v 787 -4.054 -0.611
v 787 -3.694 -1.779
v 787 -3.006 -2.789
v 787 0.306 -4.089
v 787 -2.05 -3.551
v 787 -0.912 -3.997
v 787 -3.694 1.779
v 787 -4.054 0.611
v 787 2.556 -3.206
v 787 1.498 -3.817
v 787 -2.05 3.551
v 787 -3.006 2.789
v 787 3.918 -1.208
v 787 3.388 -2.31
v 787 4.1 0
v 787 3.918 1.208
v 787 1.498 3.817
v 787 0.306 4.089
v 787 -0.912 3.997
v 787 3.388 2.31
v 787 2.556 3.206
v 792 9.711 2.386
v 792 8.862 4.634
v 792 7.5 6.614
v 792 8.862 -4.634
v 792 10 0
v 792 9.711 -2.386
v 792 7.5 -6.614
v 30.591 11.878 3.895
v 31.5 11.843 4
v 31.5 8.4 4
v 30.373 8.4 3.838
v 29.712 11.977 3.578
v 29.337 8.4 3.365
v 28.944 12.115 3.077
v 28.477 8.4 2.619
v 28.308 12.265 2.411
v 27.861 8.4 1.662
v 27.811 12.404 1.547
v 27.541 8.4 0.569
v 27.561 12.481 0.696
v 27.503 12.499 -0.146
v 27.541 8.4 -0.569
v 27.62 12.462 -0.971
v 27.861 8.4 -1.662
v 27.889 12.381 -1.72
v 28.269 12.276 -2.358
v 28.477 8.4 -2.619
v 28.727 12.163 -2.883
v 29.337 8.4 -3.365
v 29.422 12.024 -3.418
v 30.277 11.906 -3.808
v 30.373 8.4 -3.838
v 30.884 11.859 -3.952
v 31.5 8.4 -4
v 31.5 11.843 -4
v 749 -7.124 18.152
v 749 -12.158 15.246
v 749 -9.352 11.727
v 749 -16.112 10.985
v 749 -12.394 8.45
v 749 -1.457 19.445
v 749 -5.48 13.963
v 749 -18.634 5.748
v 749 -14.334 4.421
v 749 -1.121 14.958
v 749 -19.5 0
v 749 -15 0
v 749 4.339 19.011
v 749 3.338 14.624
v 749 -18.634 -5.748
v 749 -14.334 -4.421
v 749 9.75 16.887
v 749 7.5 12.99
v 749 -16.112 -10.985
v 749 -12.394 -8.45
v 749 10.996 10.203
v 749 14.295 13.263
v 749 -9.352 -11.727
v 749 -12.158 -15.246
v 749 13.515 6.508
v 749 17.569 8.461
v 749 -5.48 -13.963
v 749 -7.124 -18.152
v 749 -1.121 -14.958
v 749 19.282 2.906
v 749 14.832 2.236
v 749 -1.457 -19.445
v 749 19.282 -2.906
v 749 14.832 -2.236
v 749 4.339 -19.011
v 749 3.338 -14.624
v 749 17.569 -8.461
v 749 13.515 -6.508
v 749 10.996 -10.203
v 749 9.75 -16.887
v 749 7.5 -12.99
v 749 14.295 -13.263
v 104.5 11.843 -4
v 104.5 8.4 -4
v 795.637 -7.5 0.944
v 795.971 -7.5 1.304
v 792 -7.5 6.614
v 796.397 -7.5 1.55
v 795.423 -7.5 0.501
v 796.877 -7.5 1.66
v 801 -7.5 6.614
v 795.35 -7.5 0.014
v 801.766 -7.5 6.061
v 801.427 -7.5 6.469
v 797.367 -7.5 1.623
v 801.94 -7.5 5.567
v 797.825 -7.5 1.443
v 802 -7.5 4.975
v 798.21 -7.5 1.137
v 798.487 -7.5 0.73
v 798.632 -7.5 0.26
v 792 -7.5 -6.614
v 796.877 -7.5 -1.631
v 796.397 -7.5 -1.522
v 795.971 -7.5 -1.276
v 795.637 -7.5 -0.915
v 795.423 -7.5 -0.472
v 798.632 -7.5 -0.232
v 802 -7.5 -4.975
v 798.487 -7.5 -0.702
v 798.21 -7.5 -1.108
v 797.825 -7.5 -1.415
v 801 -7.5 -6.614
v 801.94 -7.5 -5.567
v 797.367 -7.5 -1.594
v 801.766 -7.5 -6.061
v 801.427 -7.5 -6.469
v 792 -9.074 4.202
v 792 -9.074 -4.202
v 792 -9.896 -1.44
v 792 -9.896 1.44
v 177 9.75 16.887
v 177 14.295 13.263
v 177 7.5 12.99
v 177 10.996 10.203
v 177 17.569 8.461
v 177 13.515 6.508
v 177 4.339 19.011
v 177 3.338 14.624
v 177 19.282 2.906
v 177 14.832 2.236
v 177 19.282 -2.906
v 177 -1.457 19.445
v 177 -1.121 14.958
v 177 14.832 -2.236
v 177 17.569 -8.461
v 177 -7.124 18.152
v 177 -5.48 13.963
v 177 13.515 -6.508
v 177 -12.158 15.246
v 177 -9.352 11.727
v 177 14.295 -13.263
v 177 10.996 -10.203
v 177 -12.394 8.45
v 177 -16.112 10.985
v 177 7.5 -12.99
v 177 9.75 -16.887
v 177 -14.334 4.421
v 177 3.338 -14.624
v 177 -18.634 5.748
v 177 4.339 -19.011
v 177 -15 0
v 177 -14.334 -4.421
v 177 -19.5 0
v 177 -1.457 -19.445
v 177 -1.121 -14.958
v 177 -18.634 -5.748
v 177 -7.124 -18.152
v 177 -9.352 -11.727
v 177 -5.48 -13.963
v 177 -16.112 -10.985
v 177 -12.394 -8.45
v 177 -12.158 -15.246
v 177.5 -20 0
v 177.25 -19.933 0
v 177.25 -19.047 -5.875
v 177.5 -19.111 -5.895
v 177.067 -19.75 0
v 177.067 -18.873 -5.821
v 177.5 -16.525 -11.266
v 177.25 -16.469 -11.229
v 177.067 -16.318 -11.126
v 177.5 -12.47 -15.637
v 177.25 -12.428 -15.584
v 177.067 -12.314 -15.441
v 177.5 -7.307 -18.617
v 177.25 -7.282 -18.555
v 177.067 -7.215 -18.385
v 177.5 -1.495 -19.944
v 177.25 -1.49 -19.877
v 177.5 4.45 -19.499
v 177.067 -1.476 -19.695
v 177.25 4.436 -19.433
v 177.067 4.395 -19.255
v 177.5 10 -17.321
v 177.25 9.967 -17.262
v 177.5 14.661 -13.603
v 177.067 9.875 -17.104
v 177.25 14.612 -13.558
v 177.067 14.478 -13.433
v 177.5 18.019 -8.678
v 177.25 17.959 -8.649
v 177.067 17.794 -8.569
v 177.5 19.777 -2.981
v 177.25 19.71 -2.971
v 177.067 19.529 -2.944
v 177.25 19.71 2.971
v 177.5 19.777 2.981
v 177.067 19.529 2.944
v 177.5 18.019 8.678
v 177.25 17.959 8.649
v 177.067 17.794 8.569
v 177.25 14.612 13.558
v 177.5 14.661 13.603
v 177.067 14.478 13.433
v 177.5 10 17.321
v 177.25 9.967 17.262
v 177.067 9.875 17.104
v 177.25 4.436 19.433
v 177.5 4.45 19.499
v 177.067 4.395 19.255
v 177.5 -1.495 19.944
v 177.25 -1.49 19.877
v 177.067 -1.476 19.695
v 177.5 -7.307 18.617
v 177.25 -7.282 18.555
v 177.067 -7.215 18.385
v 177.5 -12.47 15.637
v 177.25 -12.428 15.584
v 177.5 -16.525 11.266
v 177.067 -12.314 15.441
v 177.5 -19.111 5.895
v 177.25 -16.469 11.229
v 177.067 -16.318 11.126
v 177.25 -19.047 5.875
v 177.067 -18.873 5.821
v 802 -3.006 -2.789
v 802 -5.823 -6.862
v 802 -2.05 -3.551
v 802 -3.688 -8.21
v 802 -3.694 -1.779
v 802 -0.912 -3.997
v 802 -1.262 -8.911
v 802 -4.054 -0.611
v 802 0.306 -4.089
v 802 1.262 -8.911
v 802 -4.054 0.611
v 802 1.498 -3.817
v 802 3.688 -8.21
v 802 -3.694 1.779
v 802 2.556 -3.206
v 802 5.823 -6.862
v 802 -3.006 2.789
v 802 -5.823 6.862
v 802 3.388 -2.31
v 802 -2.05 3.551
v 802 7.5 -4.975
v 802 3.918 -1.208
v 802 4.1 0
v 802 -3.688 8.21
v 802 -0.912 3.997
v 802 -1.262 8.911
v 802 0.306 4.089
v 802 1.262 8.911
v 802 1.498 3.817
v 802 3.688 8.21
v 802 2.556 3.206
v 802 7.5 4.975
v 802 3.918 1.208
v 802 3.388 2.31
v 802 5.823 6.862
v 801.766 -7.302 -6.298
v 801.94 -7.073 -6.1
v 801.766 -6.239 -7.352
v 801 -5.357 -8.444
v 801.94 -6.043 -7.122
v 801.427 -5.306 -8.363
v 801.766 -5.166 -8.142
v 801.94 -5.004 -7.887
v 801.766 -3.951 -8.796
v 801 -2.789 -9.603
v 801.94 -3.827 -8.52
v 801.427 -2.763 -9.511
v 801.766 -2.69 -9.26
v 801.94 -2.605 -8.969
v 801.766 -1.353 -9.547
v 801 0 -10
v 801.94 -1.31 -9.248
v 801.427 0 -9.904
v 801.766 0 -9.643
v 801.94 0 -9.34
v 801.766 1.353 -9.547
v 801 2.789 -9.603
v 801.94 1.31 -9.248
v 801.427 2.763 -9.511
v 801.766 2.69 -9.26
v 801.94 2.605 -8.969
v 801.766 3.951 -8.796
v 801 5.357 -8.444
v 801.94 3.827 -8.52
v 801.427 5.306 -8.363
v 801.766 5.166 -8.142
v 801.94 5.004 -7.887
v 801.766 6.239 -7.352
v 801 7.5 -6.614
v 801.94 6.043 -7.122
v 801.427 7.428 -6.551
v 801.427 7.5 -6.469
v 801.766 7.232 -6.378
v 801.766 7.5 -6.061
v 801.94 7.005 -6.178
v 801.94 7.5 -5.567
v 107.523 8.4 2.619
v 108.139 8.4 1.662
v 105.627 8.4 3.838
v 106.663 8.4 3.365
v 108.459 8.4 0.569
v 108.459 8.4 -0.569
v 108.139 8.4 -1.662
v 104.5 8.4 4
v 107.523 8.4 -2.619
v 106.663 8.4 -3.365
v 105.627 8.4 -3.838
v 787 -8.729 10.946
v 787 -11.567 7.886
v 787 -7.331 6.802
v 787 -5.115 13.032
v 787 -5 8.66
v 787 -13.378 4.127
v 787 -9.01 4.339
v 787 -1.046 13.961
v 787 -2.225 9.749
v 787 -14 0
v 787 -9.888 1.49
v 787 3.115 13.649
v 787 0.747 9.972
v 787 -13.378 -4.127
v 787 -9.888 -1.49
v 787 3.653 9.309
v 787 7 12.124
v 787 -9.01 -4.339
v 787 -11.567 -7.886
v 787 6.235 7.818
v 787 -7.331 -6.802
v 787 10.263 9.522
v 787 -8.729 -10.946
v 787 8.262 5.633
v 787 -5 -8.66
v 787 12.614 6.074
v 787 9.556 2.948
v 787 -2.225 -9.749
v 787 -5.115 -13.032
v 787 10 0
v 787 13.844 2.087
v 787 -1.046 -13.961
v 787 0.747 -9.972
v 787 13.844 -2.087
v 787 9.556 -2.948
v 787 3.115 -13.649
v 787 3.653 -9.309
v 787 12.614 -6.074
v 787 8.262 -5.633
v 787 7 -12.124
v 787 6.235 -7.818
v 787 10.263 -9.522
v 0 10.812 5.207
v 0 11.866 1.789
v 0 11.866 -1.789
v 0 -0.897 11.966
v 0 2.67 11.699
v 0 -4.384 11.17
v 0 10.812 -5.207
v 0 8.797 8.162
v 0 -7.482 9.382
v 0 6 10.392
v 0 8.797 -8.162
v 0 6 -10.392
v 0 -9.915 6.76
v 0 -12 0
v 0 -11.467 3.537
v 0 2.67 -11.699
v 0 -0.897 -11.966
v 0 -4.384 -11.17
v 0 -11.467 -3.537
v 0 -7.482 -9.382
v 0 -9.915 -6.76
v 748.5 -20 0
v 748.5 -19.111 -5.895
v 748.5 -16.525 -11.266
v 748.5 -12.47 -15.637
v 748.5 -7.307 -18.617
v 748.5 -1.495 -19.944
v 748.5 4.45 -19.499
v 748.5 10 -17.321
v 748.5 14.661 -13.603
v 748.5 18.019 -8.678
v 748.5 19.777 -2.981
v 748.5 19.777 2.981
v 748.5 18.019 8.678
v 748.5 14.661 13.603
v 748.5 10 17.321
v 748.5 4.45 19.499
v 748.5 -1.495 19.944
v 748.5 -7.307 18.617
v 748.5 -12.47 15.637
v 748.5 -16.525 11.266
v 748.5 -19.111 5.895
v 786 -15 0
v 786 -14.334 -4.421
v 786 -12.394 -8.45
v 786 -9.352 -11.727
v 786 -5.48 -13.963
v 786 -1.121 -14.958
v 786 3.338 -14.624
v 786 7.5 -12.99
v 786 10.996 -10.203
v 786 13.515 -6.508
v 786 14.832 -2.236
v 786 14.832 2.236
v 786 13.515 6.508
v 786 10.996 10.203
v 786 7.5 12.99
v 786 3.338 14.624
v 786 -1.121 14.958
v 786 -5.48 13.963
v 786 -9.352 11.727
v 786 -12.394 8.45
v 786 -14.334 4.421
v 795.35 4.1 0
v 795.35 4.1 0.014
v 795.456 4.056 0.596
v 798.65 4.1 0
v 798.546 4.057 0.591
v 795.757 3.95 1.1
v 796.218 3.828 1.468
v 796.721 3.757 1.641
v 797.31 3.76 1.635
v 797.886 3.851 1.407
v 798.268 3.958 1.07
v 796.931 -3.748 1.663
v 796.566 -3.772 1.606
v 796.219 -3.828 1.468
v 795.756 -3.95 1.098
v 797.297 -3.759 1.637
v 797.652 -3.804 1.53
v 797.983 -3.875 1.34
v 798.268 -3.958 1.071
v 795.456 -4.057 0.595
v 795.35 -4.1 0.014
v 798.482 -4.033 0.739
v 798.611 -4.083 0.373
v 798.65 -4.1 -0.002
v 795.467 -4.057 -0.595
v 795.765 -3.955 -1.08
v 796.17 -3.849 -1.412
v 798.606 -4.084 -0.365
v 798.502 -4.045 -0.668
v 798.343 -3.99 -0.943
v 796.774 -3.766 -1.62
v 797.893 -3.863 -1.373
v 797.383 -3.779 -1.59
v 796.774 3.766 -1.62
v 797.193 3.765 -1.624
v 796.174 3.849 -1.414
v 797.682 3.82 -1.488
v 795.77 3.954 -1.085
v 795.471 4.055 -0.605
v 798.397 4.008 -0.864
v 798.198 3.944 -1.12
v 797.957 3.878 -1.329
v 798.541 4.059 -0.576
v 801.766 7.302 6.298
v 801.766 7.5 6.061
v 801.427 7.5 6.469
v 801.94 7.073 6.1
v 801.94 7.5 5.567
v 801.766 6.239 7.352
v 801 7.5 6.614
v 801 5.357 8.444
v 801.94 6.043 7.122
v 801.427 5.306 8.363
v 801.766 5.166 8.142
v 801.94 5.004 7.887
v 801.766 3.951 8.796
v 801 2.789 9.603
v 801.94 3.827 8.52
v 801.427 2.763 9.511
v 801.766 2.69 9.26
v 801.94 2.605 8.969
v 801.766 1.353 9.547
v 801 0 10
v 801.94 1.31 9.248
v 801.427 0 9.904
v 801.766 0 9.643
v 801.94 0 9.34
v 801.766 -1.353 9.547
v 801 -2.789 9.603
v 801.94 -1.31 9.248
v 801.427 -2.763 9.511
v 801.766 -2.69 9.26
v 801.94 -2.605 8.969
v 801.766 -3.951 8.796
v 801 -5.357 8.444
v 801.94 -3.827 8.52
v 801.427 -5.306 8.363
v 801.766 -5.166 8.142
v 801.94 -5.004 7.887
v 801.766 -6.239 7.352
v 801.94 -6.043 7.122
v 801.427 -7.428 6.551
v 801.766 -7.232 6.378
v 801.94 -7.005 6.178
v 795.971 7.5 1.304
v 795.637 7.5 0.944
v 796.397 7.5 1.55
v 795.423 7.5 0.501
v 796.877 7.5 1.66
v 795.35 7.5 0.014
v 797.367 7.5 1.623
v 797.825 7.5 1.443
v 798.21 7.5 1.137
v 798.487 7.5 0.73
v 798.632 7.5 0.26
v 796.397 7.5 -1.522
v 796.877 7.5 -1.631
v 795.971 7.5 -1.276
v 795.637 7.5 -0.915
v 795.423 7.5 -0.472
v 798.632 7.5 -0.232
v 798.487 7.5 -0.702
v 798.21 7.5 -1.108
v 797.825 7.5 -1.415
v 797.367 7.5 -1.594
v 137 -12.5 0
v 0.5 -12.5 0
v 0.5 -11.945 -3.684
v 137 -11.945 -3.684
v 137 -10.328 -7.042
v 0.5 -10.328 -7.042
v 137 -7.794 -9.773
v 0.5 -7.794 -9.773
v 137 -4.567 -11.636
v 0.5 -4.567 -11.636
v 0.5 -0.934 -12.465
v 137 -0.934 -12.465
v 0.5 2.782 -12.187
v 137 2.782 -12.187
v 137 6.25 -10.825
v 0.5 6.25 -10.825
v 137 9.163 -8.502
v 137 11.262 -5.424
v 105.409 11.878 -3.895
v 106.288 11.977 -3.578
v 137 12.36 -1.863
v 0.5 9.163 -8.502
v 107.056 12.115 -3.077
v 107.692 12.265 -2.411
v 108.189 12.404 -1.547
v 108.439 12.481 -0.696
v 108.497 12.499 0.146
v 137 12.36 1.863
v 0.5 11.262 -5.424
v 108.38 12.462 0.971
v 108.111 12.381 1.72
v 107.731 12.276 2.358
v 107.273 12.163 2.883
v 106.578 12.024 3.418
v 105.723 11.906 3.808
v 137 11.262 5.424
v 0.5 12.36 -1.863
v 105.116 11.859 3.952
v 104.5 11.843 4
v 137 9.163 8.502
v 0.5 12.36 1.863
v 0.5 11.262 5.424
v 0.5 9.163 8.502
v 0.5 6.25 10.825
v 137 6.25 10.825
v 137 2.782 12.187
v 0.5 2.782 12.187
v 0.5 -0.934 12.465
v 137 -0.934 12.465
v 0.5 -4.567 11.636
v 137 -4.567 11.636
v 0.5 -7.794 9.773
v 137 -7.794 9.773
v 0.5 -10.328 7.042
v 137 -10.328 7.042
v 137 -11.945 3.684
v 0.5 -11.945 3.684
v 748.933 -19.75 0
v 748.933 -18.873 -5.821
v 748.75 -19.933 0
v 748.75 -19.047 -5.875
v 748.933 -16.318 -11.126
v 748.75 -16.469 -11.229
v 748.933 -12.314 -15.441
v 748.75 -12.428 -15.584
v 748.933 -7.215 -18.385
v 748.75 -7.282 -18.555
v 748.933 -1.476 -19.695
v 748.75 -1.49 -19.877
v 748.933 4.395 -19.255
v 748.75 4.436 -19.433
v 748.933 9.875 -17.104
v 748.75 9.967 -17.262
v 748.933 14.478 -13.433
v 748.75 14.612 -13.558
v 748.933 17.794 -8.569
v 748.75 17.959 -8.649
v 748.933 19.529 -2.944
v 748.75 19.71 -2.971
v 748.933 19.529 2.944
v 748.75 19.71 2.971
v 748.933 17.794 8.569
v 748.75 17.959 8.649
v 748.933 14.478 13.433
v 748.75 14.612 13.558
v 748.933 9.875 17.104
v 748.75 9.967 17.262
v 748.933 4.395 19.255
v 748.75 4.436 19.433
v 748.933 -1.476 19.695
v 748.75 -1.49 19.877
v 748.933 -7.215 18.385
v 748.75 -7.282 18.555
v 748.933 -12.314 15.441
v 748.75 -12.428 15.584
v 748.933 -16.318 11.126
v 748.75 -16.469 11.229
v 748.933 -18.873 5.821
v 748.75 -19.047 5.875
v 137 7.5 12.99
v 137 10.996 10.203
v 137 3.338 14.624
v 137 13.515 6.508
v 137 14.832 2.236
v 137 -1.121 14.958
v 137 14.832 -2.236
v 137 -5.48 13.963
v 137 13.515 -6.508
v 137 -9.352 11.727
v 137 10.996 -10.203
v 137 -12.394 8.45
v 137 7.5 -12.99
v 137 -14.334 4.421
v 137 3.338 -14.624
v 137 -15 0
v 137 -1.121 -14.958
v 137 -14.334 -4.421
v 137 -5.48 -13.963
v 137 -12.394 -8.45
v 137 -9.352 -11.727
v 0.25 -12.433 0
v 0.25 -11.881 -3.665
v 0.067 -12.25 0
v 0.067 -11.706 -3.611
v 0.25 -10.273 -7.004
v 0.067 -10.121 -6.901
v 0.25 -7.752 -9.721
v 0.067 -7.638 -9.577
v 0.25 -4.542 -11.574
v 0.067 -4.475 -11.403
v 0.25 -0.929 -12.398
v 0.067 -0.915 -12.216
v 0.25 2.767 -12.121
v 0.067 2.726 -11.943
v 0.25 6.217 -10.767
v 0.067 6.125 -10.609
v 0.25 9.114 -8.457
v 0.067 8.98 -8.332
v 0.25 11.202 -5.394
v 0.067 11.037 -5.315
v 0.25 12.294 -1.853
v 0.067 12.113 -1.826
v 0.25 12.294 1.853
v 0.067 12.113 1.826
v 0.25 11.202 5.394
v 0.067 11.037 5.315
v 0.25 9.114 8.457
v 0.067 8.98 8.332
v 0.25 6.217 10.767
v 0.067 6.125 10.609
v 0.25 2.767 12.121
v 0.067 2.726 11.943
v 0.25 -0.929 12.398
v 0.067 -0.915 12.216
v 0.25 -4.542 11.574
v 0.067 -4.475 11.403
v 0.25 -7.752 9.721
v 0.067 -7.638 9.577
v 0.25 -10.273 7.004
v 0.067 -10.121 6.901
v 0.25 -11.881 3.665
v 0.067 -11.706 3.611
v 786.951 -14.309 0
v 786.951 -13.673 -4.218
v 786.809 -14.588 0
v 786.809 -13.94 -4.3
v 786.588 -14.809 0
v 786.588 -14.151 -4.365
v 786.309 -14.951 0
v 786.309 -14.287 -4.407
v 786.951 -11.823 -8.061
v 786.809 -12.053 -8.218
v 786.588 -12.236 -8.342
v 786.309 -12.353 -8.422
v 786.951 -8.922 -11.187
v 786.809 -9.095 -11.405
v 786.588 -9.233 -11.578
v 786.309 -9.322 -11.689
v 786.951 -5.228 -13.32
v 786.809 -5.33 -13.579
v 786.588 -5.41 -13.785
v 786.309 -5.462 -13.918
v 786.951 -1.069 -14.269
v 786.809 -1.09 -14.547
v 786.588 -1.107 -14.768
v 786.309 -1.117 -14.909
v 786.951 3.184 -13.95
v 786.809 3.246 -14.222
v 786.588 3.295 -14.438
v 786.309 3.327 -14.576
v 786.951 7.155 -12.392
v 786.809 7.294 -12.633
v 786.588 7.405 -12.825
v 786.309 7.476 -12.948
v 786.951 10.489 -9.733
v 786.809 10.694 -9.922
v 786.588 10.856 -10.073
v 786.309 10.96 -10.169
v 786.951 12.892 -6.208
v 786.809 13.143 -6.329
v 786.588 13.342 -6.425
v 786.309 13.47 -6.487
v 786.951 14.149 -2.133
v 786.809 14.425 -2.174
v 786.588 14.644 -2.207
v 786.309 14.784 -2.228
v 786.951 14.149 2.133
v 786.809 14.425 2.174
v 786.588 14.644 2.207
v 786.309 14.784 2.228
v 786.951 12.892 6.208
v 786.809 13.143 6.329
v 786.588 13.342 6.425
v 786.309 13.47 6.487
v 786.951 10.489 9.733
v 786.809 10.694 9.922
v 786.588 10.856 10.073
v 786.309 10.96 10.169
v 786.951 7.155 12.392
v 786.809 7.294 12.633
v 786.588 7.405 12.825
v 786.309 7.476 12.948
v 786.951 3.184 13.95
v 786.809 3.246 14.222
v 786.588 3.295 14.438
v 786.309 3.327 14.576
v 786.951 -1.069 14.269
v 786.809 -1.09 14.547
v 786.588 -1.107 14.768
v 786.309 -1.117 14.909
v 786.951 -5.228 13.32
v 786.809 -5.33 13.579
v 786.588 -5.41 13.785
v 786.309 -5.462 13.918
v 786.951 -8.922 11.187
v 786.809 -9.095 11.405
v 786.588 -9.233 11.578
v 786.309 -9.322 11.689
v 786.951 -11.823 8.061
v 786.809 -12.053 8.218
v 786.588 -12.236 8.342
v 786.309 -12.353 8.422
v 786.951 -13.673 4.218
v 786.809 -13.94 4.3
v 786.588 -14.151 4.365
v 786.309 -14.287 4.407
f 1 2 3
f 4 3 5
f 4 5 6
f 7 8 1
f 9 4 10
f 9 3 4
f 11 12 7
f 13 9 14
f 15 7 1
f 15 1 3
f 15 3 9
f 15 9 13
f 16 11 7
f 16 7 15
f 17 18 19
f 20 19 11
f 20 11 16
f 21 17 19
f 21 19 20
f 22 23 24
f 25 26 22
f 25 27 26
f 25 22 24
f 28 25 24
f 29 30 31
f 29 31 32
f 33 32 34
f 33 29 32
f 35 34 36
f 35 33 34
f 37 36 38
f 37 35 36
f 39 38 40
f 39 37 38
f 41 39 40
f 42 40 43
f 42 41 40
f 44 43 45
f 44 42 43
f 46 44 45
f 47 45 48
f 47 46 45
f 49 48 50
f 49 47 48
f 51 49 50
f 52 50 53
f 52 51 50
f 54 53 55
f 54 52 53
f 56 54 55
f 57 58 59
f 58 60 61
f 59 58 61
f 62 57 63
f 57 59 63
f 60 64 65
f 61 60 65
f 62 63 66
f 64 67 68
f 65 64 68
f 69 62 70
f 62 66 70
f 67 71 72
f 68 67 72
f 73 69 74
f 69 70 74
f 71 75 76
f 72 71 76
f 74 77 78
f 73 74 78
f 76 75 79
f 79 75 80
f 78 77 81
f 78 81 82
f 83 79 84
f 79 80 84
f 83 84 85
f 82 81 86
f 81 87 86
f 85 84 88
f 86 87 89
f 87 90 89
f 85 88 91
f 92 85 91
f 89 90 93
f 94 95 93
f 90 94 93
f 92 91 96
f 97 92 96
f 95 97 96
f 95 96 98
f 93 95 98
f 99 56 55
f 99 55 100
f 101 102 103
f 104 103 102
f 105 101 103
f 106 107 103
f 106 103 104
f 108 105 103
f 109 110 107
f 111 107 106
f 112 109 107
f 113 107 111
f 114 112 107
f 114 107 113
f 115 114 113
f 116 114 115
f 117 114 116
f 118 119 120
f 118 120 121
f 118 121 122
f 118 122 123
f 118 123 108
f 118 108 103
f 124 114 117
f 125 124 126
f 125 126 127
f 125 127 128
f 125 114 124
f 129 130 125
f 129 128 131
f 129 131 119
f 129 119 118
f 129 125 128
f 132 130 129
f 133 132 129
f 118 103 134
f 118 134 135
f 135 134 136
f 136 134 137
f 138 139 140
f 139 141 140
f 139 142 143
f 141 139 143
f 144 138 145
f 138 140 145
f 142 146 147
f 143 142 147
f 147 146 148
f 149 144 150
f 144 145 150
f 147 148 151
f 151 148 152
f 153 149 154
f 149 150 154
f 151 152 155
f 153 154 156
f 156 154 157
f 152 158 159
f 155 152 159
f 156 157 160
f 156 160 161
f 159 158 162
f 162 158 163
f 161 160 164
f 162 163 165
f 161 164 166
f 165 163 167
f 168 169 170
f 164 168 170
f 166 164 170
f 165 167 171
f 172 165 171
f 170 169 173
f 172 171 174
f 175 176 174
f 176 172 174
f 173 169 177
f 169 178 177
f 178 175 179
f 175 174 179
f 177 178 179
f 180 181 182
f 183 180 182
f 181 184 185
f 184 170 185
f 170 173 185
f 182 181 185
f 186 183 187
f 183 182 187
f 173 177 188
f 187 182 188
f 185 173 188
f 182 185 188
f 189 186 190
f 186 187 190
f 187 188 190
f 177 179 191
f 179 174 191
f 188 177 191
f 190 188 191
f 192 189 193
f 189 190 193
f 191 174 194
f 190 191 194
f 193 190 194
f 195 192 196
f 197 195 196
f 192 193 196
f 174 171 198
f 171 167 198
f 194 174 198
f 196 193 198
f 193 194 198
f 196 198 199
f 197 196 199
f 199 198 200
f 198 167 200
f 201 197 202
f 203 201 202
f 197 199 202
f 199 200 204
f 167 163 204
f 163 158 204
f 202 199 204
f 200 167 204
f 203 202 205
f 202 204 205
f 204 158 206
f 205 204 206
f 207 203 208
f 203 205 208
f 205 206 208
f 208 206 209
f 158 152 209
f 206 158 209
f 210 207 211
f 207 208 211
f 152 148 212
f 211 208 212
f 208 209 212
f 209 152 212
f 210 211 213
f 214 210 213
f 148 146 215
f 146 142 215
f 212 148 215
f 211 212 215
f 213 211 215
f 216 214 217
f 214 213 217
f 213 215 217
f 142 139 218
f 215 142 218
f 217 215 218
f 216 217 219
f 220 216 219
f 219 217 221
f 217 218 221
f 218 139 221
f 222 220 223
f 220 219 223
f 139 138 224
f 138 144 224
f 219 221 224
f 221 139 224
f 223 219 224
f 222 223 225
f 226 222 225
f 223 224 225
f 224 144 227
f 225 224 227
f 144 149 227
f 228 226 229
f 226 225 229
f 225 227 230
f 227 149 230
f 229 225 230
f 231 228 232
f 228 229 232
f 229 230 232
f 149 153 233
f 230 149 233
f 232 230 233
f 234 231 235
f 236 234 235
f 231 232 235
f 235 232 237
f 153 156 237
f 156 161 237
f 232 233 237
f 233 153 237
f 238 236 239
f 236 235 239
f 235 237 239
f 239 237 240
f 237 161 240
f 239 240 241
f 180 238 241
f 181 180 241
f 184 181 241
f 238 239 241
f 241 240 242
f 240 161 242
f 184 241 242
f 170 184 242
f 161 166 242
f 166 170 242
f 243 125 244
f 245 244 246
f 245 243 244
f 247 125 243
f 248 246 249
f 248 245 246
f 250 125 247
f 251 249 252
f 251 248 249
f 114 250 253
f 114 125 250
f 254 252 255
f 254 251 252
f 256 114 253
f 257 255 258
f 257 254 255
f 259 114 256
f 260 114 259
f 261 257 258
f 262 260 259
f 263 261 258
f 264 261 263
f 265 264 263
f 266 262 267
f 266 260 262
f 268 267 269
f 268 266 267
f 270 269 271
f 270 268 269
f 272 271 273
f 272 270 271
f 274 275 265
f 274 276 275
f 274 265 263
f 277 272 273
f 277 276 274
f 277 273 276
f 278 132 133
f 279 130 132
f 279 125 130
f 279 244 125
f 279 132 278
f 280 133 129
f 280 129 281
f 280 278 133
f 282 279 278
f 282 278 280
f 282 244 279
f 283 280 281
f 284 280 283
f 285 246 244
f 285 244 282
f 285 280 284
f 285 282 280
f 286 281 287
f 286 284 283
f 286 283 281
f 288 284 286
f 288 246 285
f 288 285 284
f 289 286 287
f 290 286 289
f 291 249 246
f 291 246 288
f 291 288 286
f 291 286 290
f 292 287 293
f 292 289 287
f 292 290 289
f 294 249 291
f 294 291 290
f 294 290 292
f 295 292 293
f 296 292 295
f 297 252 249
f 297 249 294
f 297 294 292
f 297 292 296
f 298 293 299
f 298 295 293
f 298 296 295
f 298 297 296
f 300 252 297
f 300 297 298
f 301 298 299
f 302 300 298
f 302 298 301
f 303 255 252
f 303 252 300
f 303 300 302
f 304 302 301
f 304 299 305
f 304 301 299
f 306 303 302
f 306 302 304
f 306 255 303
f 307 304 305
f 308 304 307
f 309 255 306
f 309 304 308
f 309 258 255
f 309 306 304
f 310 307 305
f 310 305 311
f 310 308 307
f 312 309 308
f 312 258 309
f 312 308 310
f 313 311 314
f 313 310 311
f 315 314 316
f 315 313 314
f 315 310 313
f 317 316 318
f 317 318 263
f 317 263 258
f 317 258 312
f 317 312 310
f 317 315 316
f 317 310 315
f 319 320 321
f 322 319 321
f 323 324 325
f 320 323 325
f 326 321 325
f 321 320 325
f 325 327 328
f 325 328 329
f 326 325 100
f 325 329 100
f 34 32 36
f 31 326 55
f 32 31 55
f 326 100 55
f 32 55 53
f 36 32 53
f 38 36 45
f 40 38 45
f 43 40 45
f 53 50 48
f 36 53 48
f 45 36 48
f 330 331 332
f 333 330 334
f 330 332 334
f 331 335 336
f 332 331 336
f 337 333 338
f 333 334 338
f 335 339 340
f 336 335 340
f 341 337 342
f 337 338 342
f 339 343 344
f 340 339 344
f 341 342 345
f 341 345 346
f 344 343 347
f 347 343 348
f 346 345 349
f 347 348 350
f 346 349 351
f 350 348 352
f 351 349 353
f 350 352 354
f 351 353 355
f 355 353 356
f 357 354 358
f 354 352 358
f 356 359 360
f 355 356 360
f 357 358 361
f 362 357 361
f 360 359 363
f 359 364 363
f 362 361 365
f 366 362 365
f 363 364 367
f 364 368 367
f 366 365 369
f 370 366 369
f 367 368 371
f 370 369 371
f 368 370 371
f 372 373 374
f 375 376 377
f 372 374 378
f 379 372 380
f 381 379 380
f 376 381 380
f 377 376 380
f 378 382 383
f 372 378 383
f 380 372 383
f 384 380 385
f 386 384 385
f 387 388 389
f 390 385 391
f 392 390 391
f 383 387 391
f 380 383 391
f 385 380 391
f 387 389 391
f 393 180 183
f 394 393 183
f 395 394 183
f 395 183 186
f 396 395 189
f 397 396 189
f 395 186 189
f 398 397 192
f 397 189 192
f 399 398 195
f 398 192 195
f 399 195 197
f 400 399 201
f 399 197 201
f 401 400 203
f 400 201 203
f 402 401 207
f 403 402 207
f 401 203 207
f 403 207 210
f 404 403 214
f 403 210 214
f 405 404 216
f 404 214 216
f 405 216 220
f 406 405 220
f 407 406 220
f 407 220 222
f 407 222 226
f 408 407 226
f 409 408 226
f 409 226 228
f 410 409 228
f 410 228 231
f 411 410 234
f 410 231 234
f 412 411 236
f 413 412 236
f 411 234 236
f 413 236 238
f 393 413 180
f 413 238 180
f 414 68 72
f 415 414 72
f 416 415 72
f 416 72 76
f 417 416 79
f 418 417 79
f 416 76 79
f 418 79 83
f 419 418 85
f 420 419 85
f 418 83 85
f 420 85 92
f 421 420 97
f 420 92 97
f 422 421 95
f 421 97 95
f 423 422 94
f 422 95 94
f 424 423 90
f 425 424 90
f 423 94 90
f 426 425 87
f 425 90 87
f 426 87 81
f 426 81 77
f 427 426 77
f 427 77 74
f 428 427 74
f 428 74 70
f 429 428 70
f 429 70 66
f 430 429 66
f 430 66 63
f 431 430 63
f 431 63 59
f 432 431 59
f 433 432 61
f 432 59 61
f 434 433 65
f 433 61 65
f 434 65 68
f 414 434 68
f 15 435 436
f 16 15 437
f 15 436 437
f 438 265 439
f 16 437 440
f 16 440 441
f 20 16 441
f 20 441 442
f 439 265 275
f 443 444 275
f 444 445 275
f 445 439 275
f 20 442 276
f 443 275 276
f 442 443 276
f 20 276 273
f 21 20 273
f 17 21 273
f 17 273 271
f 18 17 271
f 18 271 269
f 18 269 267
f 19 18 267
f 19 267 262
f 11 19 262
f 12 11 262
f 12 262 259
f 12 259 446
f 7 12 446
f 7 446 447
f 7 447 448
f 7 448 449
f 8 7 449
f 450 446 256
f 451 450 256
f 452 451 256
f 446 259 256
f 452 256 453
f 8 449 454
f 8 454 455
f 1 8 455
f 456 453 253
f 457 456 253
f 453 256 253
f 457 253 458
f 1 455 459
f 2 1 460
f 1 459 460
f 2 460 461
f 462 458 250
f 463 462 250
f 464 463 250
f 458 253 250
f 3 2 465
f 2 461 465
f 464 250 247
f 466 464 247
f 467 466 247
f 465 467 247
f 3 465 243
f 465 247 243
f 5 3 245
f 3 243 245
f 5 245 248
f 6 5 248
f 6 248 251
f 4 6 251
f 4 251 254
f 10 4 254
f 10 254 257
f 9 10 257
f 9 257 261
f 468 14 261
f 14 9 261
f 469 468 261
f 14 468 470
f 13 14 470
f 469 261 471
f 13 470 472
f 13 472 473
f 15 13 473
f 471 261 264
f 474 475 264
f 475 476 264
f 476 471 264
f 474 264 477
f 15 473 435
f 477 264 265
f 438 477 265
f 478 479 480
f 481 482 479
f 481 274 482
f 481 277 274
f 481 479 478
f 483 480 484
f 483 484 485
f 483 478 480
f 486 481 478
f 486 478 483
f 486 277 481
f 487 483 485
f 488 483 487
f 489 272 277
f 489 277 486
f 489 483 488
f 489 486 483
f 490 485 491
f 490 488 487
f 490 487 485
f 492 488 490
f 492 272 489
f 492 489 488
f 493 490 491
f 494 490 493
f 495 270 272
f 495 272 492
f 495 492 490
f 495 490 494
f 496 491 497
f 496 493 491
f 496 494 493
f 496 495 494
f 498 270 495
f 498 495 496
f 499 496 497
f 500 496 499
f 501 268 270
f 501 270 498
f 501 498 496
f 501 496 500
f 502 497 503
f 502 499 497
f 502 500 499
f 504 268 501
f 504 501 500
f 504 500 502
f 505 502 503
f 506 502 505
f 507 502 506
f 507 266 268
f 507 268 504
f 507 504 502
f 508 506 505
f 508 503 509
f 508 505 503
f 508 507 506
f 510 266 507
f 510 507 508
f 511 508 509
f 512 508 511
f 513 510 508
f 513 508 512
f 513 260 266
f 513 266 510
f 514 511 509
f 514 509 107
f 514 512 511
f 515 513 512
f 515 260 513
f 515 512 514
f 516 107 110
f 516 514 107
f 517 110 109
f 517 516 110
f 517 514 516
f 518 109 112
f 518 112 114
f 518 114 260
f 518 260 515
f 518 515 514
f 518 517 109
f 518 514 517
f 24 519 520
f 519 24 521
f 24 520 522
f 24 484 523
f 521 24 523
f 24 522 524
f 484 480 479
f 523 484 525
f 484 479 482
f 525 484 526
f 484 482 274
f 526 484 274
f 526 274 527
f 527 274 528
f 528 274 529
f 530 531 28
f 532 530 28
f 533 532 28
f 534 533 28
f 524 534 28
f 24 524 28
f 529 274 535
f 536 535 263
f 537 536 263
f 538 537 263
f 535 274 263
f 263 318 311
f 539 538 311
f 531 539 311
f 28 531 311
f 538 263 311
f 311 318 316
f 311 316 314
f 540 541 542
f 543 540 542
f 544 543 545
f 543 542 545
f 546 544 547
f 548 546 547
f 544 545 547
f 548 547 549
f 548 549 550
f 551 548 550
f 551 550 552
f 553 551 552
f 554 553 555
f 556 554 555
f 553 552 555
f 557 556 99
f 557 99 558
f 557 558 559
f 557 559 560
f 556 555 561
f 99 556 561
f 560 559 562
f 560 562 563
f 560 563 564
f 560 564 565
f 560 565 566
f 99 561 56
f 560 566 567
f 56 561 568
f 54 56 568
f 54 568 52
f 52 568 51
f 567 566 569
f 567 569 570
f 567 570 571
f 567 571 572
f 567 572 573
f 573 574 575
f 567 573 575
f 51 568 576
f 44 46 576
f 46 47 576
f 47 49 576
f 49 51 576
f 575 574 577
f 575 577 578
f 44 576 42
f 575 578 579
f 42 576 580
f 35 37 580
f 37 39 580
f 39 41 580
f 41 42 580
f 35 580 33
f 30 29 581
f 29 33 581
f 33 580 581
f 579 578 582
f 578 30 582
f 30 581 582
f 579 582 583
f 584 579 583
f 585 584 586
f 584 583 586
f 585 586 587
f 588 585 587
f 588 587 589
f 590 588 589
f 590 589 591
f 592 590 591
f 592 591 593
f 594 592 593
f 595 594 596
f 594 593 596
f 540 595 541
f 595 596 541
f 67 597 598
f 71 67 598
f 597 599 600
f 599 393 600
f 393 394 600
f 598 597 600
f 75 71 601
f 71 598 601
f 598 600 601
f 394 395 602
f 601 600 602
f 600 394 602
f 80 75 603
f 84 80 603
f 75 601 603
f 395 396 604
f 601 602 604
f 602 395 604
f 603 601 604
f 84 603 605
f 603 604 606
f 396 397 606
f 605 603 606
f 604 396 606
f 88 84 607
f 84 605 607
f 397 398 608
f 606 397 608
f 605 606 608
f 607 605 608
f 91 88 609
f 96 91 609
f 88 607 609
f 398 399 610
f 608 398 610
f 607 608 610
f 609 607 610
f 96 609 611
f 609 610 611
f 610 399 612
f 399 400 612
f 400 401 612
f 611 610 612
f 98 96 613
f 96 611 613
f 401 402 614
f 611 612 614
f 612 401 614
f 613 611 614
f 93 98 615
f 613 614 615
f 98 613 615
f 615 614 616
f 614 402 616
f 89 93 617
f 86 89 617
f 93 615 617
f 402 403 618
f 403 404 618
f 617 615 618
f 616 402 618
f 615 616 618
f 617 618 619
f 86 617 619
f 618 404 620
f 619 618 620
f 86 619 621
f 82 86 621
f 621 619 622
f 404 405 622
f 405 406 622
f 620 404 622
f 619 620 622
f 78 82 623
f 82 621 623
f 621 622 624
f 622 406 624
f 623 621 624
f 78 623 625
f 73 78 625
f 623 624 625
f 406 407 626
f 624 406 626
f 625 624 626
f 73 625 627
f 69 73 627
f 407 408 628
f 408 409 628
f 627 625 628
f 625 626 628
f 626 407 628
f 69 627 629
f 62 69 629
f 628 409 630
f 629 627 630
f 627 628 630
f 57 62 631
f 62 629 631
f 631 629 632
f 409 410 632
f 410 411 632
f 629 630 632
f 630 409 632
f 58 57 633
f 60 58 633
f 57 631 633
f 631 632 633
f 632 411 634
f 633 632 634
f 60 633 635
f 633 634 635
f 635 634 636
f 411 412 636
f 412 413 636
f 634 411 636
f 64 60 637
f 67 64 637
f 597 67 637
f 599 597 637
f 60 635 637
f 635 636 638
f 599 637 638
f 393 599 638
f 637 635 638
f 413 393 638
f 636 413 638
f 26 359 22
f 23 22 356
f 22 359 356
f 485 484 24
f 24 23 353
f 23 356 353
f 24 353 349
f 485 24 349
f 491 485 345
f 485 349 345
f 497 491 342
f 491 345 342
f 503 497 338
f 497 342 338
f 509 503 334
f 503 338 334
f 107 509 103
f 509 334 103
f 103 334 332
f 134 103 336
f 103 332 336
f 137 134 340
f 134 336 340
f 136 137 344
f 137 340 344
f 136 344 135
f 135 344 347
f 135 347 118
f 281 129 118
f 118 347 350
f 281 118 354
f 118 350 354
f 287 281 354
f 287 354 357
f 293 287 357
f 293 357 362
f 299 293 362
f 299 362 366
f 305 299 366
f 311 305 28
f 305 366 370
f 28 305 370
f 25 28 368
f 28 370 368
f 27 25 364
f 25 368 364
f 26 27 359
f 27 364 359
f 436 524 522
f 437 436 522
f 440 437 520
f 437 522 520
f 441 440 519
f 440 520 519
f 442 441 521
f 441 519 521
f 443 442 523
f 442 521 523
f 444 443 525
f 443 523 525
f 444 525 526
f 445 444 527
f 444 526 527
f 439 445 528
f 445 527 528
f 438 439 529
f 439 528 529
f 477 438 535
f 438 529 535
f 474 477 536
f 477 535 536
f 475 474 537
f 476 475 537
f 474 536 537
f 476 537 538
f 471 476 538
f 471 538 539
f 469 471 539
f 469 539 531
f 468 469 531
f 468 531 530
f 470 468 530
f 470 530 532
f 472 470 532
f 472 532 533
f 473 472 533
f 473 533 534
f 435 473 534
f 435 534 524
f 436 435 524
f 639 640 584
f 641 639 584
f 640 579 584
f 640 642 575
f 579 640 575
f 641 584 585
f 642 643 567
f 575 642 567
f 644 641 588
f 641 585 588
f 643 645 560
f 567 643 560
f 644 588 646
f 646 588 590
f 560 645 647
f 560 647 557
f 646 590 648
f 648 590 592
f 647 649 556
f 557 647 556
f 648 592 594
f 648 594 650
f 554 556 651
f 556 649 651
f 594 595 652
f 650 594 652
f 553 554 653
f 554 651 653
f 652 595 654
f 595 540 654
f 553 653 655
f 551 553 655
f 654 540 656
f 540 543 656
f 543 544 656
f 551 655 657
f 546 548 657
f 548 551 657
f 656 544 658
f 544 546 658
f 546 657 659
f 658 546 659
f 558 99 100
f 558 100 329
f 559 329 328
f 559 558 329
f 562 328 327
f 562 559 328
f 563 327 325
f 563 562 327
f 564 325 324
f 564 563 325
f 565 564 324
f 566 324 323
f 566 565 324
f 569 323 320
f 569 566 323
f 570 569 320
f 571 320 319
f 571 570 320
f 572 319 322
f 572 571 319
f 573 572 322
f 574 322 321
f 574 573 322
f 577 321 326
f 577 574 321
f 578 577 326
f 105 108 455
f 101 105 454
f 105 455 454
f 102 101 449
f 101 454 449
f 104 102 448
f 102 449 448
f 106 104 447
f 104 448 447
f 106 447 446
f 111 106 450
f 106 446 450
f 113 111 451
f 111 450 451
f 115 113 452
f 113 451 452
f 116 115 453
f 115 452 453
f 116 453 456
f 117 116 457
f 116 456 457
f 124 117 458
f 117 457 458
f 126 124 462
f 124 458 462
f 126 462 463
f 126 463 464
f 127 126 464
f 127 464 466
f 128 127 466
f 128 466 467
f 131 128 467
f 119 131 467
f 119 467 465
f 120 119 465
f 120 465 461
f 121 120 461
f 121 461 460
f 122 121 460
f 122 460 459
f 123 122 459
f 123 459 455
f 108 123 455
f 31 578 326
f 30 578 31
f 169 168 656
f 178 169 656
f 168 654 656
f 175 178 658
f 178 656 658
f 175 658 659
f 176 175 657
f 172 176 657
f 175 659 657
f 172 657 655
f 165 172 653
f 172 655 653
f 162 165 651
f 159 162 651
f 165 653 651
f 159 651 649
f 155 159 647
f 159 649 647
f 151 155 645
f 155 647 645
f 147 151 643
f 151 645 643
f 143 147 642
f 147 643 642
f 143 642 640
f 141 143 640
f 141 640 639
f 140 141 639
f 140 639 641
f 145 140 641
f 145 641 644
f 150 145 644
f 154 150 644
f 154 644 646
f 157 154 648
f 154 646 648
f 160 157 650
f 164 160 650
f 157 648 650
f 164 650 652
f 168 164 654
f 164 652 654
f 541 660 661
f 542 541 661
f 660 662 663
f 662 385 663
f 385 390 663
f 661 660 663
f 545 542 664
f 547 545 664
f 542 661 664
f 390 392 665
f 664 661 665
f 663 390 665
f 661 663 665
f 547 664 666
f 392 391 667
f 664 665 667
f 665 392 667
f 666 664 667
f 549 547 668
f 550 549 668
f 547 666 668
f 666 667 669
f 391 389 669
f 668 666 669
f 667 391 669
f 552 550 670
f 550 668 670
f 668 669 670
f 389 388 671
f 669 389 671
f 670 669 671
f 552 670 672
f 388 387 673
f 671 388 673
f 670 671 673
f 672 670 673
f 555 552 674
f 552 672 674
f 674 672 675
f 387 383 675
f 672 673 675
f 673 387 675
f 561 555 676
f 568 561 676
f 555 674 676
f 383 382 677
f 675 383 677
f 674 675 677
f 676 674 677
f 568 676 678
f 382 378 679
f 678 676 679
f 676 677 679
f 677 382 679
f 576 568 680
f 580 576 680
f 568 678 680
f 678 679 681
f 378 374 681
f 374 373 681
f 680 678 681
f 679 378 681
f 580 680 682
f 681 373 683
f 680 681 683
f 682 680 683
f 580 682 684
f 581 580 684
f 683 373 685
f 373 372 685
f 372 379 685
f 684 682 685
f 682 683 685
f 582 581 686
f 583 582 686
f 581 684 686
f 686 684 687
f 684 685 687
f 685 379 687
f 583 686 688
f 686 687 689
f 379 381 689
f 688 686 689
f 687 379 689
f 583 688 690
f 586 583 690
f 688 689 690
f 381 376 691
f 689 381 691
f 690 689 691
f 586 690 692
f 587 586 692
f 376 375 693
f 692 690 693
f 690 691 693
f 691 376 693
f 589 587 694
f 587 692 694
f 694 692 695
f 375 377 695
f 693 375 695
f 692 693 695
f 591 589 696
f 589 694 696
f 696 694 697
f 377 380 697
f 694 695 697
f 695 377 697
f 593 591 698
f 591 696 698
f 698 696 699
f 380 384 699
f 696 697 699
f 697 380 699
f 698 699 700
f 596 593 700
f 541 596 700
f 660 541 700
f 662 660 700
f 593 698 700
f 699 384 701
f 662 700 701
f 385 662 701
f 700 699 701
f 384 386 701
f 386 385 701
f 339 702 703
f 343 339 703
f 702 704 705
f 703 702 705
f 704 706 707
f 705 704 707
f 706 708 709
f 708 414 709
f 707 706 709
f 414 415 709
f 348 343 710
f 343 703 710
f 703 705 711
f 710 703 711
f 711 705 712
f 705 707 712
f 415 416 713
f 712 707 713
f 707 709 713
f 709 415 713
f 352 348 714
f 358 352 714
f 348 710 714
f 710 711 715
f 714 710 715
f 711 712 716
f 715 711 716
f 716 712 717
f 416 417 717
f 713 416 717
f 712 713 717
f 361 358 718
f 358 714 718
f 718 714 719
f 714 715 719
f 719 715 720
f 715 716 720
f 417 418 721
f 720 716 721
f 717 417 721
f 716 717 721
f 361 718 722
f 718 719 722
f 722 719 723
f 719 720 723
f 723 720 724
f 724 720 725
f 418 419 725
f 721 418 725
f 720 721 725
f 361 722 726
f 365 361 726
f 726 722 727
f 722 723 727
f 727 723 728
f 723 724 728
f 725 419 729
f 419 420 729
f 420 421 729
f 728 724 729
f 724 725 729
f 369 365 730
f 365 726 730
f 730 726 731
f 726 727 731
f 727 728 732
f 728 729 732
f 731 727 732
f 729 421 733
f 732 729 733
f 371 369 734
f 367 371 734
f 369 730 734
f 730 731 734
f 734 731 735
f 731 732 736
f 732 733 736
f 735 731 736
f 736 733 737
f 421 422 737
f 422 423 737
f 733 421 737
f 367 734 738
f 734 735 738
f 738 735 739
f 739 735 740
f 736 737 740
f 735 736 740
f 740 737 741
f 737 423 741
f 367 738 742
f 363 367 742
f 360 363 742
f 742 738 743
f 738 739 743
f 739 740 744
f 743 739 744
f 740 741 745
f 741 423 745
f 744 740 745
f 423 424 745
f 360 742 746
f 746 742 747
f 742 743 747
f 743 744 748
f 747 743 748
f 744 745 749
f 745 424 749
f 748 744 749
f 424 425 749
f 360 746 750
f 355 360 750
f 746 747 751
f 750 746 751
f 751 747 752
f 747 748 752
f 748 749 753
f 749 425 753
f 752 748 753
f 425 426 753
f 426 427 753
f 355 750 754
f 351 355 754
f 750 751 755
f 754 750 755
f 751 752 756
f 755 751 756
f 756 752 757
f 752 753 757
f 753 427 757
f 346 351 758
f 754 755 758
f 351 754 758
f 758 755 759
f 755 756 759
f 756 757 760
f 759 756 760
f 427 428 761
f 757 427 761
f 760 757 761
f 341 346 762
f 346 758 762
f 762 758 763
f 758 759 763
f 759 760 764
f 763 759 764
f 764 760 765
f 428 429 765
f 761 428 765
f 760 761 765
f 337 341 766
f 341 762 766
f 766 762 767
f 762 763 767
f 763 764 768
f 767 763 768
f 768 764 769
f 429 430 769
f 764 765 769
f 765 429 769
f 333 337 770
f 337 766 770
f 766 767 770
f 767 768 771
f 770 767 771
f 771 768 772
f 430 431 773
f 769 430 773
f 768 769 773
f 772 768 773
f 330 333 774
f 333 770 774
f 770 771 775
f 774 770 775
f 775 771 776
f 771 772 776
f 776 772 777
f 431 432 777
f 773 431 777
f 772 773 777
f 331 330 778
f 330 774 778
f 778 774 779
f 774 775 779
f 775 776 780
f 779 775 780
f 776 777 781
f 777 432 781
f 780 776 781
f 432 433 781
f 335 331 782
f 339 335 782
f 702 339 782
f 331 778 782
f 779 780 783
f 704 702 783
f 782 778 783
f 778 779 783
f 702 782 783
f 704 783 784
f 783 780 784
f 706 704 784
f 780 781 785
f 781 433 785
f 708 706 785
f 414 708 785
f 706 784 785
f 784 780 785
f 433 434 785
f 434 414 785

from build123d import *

# Parameters (mm, degrees)
IZIM3_R                     = 10
Y_KSEKLIK_EKSTR_ZYON2_DEPTH = 15
IZIM4_R                     = 4.1
KES_EKSTR_ZYON1_DEPTH       = 15
IZIM5_W                     = 15
IZIM5_H                     = 5
KES_EKSTR_ZYON2_DEPTH       = 10
IZIM6_R                     = 1.65
KES_EKSTR_ZYON3_DEPTH       = 21
RADYUS1_R                   = 1
KES_EKSTR_ZYON4_DEPTH       = 4.1
RADYUS2_R                   = 0.5


with BuildPart() as part:
    # Çizim1 → Döndür1 (revolve)
    with BuildSketch(Plane.XY, mode=Mode.PRIVATE) as d_nd_r1_sk:
        Polygon((0, 0), (787, 0), (787, 15), (749, 15), (749, 20), (177, 20), (177, 15), (137, 15), (137, 12.5), (0, 12.5), align=None)
    revolve(d_nd_r1_sk.sketch.rotate(Axis((0, 0, 0), (1, 0, 0)), 180), axis=Axis((0, 0, 0), (1, 0, 0)))

    # Çizim3 → Yükseklik-Ekstrüzyon2 (add)
    with BuildSketch(Plane(origin=(787, 0, 0), x_dir=(0, 0, -1), z_dir=(1, 0, 0))):
        with Locations(Location((0, 0, 0), (0, 0, 90))):
            Circle(IZIM3_R)
    extrude(amount=Y_KSEKLIK_EKSTR_ZYON2_DEPTH)

    # Çizim4 → Kes-Ekstrüzyon1 (cut)
    with BuildSketch(Plane(origin=(802, 0, 0), x_dir=(0, 0, -1), z_dir=(1, 0, 0))):
        with Locations(Location((0, 0, 0), (0, 0, 90))):
            Circle(IZIM4_R)
    extrude(amount=-KES_EKSTR_ZYON1_DEPTH, mode=Mode.SUBTRACT)

    # Çizim5 → Kes-Ekstrüzyon2 (cut)
    with BuildSketch(Plane(origin=(802, 0, 0), x_dir=(0, 0, -1), z_dir=(1, 0, 0))):
        with Locations((0, 10)):
            Rectangle(IZIM5_W, IZIM5_H)
        with Locations((0, -10)):
            Rectangle(IZIM5_W, IZIM5_H)
    extrude(amount=-KES_EKSTR_ZYON2_DEPTH, mode=Mode.SUBTRACT)

    # Çizim6 → Kes-Ekstrüzyon3 (cut)
    with BuildSketch(Plane(origin=(0, 7.5, 0), x_dir=(1, 0, 0), z_dir=(0, 1, 0))):
        with Locations(Location((797, -0.014378278, 0), (0, 0, 180))):
            Circle(IZIM6_R)
    extrude(amount=-KES_EKSTR_ZYON3_DEPTH, mode=Mode.SUBTRACT)

    # Radyus1
    radyus1_edges = [part.edges().sort_by_distance(p)[0] for p in [
        (787, 15, 0),
        (802, 0, 10),
        (802, 0, -10),
    ]]
    fillet(radyus1_edges, radius=RADYUS1_R)

    # Çizim7 → Kes-Ekstrüzyon4 (cut)
    with BuildSketch(Plane(origin=(0, 12.5, 0), x_dir=(1, 0, 0), z_dir=(0, 1, 0))):
        with BuildLine():
            Line((31.5, 4), (104.5, 4))
            ThreePointArc((104.5, 4), (108.5, 0), (104.5, -4))
            Line((104.5, -4), (31.5, -4))
            ThreePointArc((31.5, -4), (27.5, 0), (31.5, 4))
        make_face()
    extrude(amount=-KES_EKSTR_ZYON4_DEPTH, mode=Mode.SUBTRACT)

    # Radyus2
    radyus2_edges = [part.edges().sort_by_distance(p)[0] for p in [
        (749, 20, 0),
        (0, 12.5, 0),
        (177, 20, 0),
    ]]
    fillet(radyus2_edges, radius=RADYUS2_R)


solid = part.part
